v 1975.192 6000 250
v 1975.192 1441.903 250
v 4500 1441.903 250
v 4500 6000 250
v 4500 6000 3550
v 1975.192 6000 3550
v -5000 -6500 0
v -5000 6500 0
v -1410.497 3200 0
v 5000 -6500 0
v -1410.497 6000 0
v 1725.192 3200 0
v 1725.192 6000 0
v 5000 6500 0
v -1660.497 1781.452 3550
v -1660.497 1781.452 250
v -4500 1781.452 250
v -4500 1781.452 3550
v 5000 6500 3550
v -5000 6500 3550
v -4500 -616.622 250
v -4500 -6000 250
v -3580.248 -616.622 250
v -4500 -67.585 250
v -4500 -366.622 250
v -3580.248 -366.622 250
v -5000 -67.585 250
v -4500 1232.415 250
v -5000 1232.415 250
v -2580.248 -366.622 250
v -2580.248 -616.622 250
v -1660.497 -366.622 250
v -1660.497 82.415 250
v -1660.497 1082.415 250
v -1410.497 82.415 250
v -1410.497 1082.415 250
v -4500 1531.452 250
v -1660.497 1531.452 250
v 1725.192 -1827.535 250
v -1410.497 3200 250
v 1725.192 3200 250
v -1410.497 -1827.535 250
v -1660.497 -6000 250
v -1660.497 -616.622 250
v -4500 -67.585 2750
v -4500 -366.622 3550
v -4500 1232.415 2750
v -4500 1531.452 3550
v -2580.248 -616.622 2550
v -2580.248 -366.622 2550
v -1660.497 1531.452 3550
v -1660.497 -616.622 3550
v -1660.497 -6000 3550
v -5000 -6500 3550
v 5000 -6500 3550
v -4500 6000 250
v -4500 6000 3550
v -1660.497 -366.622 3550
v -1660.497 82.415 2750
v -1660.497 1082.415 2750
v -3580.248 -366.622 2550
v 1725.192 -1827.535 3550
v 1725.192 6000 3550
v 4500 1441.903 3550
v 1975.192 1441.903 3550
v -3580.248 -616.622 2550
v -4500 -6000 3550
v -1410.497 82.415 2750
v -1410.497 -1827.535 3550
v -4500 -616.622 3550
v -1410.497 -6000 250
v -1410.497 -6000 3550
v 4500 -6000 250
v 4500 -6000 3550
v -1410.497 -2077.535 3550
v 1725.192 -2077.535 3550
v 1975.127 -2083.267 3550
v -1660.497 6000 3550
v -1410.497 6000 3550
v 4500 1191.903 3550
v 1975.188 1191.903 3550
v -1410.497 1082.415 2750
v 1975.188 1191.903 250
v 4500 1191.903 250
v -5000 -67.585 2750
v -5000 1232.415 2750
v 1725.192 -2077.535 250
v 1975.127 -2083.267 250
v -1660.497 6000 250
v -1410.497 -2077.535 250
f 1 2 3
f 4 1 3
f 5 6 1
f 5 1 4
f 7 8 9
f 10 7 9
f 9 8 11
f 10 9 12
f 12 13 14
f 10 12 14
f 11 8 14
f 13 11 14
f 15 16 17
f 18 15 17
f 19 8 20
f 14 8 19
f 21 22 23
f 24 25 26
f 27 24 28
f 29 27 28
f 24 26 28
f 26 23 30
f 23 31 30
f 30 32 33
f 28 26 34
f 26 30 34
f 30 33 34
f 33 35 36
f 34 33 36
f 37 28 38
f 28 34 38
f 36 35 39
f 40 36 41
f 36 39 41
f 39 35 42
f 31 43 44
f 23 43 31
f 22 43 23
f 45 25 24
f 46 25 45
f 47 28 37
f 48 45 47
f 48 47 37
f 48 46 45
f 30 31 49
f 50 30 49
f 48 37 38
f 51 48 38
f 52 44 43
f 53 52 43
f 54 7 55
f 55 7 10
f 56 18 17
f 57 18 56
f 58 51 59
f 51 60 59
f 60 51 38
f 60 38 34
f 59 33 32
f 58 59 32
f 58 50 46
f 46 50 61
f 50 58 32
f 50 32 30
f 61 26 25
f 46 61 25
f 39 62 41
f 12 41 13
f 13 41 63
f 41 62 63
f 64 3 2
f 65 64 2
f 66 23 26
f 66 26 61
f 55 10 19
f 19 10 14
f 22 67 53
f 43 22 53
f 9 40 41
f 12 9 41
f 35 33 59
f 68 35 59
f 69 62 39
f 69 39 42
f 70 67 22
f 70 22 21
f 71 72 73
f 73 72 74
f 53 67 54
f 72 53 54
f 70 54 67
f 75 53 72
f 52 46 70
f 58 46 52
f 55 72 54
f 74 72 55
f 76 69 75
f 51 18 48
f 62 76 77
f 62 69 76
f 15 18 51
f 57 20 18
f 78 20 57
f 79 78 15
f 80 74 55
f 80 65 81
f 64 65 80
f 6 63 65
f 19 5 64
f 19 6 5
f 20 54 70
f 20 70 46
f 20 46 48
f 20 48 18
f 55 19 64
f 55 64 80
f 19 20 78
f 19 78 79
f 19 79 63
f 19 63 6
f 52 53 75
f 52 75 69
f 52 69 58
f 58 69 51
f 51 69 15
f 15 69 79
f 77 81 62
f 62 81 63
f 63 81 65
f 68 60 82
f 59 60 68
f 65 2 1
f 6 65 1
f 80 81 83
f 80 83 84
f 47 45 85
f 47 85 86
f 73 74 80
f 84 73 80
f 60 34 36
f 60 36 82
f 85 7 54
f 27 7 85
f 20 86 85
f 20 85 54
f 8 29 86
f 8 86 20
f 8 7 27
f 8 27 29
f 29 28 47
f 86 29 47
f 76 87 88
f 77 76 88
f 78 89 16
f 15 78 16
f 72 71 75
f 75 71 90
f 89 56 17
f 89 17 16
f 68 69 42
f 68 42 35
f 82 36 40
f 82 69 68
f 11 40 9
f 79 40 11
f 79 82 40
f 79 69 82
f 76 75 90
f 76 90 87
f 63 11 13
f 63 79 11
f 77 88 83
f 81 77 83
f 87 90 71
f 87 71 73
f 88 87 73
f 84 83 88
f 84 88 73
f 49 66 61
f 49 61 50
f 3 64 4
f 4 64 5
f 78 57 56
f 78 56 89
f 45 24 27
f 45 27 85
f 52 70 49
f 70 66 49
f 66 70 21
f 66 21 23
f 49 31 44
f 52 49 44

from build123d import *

# Parameters (mm, degrees)
F0_W      = 10000
F0_H      = 13000
F1_DEPTH  = 3550
F2_W      = 9000
F2_H      = 12000
F3_DEPTH  = 3300
F5_DEPTH  = 3300
F6_W      = 1000
F6_H      = 2300
F7_DEPTH  = 250
F8_W      = 1300
F8_H      = 2500
F9_DEPTH  = 21453
F10_W     = 1000
F10_H     = 2500
F11_DEPTH = 250
F12_W     = 3135.6891602224
F12_H     = 2800
F13_DEPTH = 250


# Not quite as in the source:
# - an extrude ends at something that could not be found from the text; its depth is read off the source's solid
# - a feature names something its author has since deleted; it is built from what else it names


with BuildPart() as f1:
    # F0 (on Top) → F1 (new body)
    with BuildSketch(Plane.XY):
        Rectangle(F0_W, F0_H)
    extrude(amount=F1_DEPTH)

    # F2 (on face) → F3 (cut)
    with BuildSketch(Plane.XY.offset(3550)):
        Rectangle(F2_W, F2_H)
    extrude(amount=-F3_DEPTH, mode=Mode.SUBTRACT)

    # F4 (on face) → F5 (join)
    with BuildSketch(Plane.XY.offset(250)):
        Polygon((-1660.4968309402, -366.6217029095), (-4500, -366.6217029095), (-4500, -616.6217029095), (-1660.4968309402, -616.6217029095), (-1660.4968309402, -6000), (-1410.4968309402, -6000), (-1410.4968309402, -2077.5351682588), (1725.1923292822, -2077.5351682588), (1975.1266148544, -2083.2669128011), (1975.1876689086, 1191.9026374817), (4500, 1191.9026374817), (4500, 1441.9026374817), (1975.1923292822, 1441.9026374817), (1975.1923292822, 6000), (1725.1923292822, 6000), (1725.1923292822, 1441.9026374817), (1725.1923292822, -1827.5351682588), (-1410.4968309402, -1827.5351682588), (-1410.4968309402, 6000), (-1660.4968309402, 6000), (-1660.4968309402, 1781.4515829086), (-4500, 1781.4515829086), (-4500, 1531.4515829086), (-1660.4968309402, 1531.4515829086), align=None)
    extrude(amount=F5_DEPTH)

    # F6 (on face) → F7 (cut)
    with BuildSketch(Plane.XZ.offset(616.6217029095)):
        with Locations((-3080.2484154701, 1400)):
            Rectangle(F6_W, F6_H)
    extrude(amount=-F7_DEPTH, mode=Mode.SUBTRACT)

    # F8 (on face) → F9 (cut, through all)
    with BuildSketch(Plane.YZ.offset(-4500)):
        with Locations((582.4149399996, 1500)):
            Rectangle(F8_W, F8_H)
    extrude(amount=-F9_DEPTH, mode=Mode.SUBTRACT)

    # F10 (on face) → F11 (cut, through all)
    with BuildSketch(Plane(origin=(-1660.4968309402, 0, 0), x_dir=(0, -1, 0), z_dir=(-1, 0, 0))):
        with Locations((-582.4149399996, 1500)):
            Rectangle(F10_W, F10_H)
    extrude(amount=-F11_DEPTH, mode=Mode.SUBTRACT)

    # F12 (on face) → F13 (cut, through all)
    with BuildSketch(Plane.XY.offset(250)):
        with Locations((157.347749171, 4600)):
            Rectangle(F12_W, F12_H)
    extrude(amount=-F13_DEPTH, mode=Mode.SUBTRACT)


solid = f1.part
